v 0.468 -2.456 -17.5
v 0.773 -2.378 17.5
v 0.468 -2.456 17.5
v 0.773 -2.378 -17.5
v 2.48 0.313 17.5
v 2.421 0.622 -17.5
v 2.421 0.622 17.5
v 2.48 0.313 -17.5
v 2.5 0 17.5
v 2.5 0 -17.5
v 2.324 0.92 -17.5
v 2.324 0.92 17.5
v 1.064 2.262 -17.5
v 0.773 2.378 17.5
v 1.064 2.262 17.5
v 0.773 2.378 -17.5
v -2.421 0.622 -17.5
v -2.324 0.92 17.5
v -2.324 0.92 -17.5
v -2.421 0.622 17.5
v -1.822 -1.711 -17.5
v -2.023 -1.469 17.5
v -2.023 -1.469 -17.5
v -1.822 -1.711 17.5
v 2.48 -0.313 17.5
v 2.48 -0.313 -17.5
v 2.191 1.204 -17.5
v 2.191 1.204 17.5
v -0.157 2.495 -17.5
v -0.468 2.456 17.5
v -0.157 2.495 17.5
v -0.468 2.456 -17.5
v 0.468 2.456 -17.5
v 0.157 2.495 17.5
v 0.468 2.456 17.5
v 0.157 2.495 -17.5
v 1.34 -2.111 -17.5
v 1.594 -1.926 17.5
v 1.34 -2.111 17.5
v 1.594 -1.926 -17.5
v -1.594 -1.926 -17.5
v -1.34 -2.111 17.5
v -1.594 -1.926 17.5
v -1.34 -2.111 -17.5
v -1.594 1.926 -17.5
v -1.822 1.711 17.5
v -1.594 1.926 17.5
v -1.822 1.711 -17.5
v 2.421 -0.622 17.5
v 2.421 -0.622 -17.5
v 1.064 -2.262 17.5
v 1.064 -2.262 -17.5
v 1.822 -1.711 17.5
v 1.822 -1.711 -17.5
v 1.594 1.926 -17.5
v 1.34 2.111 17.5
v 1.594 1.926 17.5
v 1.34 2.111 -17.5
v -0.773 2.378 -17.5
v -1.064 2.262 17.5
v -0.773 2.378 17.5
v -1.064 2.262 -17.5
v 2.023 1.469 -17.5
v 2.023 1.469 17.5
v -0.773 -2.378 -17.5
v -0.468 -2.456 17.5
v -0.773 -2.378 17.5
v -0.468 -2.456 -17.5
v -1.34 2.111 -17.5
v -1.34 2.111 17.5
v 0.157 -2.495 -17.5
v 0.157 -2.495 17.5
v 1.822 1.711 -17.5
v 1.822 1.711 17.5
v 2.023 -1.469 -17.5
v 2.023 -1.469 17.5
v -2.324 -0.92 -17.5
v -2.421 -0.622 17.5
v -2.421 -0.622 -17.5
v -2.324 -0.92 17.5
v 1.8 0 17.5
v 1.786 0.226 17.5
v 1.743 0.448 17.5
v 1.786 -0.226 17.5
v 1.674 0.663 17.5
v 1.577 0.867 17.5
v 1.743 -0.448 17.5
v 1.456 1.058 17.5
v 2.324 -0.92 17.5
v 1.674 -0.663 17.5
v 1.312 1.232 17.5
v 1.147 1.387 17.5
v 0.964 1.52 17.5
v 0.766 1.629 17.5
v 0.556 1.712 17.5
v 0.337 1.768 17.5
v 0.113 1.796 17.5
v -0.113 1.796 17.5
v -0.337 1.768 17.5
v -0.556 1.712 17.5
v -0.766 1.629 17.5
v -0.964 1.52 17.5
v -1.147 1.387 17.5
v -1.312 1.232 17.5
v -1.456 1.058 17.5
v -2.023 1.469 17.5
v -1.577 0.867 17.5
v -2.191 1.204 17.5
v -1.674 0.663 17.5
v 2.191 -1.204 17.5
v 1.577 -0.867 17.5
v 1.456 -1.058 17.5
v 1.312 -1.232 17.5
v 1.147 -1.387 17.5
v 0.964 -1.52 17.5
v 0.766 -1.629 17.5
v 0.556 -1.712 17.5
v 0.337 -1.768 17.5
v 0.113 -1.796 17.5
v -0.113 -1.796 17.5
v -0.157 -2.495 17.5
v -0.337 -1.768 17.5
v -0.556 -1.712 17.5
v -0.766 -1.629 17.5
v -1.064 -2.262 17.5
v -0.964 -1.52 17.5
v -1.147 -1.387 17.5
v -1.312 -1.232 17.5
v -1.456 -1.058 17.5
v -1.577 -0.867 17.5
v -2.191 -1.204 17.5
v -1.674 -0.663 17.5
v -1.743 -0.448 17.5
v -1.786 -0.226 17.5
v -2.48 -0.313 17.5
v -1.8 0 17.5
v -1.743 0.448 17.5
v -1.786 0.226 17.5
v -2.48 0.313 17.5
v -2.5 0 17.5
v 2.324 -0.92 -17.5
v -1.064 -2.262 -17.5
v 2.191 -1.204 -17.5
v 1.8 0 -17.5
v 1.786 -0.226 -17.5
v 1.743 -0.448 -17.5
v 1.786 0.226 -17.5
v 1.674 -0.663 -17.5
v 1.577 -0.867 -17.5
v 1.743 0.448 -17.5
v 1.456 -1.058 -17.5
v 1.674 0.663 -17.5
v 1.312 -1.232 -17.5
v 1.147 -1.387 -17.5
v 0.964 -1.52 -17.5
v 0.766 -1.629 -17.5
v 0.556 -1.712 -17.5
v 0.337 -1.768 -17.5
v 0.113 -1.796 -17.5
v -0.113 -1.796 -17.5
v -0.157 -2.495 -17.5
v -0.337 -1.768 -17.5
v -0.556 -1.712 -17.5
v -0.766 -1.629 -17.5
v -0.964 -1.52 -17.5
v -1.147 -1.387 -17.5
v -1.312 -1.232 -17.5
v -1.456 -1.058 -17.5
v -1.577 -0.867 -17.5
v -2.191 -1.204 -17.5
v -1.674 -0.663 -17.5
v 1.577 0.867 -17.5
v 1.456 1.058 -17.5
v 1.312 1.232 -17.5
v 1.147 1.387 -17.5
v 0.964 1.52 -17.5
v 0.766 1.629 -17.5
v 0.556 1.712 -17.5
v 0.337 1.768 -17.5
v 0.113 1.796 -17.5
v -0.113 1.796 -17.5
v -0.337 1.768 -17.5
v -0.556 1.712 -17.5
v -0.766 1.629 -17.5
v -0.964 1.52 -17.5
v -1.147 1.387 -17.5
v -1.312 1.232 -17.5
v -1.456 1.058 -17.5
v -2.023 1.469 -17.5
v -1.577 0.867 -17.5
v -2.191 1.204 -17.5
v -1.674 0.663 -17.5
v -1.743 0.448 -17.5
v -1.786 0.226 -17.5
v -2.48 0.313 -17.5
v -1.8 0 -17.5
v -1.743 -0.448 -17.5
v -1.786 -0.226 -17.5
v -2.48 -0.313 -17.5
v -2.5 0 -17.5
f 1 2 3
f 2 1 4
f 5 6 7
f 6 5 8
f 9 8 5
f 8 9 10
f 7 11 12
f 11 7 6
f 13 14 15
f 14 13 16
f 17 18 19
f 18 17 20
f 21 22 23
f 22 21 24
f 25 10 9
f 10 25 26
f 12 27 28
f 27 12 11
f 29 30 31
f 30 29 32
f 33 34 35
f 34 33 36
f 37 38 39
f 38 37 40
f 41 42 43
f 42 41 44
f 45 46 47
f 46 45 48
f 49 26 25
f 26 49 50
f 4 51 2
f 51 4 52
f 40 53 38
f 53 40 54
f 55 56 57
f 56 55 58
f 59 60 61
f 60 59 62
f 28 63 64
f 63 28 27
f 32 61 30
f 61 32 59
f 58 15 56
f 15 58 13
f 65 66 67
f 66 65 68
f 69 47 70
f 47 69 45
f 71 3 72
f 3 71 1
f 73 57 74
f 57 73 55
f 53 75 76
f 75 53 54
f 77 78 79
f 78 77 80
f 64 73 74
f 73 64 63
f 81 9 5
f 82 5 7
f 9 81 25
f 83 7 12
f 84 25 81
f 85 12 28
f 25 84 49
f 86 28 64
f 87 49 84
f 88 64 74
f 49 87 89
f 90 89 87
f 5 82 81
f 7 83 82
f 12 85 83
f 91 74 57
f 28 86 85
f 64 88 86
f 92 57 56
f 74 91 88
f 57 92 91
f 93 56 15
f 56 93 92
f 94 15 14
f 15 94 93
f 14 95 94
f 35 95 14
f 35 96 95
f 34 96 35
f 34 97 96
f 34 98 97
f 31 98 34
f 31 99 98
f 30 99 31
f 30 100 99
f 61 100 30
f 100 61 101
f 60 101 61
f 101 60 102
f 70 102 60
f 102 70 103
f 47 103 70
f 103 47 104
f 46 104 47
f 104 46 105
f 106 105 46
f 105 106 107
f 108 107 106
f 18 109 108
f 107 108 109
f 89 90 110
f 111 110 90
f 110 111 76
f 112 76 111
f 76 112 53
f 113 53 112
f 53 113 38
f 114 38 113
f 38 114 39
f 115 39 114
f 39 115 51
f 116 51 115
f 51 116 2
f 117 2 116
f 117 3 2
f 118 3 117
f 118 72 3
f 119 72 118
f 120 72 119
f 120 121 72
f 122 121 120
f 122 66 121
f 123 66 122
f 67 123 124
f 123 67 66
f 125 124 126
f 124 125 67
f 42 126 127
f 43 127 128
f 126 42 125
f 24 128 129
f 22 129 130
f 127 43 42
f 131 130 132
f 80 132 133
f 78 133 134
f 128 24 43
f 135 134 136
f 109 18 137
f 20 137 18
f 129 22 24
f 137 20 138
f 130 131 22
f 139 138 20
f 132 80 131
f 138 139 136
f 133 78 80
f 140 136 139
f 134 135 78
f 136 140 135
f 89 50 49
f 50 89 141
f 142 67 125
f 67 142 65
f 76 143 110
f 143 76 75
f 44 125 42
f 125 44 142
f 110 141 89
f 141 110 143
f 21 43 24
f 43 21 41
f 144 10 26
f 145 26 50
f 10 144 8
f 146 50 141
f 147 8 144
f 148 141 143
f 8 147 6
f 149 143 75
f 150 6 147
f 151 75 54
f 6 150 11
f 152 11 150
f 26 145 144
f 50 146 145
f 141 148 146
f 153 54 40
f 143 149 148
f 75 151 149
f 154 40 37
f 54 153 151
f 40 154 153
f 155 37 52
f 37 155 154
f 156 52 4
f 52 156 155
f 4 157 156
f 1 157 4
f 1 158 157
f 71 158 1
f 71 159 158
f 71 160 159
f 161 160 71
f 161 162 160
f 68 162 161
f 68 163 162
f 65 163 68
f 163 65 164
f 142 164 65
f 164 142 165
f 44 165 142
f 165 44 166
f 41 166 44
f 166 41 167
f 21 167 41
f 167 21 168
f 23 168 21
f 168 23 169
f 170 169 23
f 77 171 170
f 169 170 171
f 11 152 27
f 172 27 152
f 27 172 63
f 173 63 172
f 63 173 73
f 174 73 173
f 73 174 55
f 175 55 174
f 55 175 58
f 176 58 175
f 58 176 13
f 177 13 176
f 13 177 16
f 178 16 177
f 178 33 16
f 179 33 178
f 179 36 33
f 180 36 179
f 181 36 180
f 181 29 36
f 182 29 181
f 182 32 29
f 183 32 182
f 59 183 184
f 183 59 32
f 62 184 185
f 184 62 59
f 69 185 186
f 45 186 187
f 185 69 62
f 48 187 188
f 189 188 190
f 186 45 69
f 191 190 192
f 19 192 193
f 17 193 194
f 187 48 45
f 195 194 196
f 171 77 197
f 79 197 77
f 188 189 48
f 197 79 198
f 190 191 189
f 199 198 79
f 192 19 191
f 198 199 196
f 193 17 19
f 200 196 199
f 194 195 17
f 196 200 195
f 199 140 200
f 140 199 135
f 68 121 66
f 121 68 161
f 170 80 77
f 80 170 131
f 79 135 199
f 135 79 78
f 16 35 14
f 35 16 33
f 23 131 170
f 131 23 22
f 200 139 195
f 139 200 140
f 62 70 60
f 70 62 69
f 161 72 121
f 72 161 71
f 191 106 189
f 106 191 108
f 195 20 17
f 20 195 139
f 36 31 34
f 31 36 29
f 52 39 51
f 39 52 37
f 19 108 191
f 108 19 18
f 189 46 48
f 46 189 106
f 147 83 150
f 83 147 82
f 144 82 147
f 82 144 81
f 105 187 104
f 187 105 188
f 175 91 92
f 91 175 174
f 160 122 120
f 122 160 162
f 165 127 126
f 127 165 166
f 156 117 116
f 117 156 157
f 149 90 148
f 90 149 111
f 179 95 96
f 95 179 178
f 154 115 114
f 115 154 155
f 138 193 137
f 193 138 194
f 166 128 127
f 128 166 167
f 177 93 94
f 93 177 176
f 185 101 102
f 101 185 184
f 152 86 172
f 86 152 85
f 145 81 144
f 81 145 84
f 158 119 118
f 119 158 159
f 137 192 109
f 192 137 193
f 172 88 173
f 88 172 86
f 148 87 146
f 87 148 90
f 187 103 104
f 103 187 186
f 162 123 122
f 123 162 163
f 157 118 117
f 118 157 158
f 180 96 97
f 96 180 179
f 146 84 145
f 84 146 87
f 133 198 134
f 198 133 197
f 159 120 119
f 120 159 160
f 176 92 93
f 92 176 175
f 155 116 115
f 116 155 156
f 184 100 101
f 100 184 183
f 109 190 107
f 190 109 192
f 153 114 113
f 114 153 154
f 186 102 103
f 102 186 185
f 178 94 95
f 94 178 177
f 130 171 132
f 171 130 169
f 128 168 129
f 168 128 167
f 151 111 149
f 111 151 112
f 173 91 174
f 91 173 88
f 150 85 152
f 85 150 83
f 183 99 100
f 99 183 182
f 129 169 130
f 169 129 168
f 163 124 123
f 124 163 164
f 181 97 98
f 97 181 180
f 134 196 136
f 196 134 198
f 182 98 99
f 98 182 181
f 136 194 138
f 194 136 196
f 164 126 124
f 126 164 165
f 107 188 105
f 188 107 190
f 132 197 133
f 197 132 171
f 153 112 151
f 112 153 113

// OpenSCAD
$fn = 50;


difference() {
	union() {
		translate(v = [0, 0, -17.5000000000]) {
			cylinder(h = 35, r = 2.5000000000);
		}
	}
	union() {
		#translate(v = [0, 0, -100.0000000000]) {
			cylinder(h = 200, r = 1.8000000000);
		}
	}
}
